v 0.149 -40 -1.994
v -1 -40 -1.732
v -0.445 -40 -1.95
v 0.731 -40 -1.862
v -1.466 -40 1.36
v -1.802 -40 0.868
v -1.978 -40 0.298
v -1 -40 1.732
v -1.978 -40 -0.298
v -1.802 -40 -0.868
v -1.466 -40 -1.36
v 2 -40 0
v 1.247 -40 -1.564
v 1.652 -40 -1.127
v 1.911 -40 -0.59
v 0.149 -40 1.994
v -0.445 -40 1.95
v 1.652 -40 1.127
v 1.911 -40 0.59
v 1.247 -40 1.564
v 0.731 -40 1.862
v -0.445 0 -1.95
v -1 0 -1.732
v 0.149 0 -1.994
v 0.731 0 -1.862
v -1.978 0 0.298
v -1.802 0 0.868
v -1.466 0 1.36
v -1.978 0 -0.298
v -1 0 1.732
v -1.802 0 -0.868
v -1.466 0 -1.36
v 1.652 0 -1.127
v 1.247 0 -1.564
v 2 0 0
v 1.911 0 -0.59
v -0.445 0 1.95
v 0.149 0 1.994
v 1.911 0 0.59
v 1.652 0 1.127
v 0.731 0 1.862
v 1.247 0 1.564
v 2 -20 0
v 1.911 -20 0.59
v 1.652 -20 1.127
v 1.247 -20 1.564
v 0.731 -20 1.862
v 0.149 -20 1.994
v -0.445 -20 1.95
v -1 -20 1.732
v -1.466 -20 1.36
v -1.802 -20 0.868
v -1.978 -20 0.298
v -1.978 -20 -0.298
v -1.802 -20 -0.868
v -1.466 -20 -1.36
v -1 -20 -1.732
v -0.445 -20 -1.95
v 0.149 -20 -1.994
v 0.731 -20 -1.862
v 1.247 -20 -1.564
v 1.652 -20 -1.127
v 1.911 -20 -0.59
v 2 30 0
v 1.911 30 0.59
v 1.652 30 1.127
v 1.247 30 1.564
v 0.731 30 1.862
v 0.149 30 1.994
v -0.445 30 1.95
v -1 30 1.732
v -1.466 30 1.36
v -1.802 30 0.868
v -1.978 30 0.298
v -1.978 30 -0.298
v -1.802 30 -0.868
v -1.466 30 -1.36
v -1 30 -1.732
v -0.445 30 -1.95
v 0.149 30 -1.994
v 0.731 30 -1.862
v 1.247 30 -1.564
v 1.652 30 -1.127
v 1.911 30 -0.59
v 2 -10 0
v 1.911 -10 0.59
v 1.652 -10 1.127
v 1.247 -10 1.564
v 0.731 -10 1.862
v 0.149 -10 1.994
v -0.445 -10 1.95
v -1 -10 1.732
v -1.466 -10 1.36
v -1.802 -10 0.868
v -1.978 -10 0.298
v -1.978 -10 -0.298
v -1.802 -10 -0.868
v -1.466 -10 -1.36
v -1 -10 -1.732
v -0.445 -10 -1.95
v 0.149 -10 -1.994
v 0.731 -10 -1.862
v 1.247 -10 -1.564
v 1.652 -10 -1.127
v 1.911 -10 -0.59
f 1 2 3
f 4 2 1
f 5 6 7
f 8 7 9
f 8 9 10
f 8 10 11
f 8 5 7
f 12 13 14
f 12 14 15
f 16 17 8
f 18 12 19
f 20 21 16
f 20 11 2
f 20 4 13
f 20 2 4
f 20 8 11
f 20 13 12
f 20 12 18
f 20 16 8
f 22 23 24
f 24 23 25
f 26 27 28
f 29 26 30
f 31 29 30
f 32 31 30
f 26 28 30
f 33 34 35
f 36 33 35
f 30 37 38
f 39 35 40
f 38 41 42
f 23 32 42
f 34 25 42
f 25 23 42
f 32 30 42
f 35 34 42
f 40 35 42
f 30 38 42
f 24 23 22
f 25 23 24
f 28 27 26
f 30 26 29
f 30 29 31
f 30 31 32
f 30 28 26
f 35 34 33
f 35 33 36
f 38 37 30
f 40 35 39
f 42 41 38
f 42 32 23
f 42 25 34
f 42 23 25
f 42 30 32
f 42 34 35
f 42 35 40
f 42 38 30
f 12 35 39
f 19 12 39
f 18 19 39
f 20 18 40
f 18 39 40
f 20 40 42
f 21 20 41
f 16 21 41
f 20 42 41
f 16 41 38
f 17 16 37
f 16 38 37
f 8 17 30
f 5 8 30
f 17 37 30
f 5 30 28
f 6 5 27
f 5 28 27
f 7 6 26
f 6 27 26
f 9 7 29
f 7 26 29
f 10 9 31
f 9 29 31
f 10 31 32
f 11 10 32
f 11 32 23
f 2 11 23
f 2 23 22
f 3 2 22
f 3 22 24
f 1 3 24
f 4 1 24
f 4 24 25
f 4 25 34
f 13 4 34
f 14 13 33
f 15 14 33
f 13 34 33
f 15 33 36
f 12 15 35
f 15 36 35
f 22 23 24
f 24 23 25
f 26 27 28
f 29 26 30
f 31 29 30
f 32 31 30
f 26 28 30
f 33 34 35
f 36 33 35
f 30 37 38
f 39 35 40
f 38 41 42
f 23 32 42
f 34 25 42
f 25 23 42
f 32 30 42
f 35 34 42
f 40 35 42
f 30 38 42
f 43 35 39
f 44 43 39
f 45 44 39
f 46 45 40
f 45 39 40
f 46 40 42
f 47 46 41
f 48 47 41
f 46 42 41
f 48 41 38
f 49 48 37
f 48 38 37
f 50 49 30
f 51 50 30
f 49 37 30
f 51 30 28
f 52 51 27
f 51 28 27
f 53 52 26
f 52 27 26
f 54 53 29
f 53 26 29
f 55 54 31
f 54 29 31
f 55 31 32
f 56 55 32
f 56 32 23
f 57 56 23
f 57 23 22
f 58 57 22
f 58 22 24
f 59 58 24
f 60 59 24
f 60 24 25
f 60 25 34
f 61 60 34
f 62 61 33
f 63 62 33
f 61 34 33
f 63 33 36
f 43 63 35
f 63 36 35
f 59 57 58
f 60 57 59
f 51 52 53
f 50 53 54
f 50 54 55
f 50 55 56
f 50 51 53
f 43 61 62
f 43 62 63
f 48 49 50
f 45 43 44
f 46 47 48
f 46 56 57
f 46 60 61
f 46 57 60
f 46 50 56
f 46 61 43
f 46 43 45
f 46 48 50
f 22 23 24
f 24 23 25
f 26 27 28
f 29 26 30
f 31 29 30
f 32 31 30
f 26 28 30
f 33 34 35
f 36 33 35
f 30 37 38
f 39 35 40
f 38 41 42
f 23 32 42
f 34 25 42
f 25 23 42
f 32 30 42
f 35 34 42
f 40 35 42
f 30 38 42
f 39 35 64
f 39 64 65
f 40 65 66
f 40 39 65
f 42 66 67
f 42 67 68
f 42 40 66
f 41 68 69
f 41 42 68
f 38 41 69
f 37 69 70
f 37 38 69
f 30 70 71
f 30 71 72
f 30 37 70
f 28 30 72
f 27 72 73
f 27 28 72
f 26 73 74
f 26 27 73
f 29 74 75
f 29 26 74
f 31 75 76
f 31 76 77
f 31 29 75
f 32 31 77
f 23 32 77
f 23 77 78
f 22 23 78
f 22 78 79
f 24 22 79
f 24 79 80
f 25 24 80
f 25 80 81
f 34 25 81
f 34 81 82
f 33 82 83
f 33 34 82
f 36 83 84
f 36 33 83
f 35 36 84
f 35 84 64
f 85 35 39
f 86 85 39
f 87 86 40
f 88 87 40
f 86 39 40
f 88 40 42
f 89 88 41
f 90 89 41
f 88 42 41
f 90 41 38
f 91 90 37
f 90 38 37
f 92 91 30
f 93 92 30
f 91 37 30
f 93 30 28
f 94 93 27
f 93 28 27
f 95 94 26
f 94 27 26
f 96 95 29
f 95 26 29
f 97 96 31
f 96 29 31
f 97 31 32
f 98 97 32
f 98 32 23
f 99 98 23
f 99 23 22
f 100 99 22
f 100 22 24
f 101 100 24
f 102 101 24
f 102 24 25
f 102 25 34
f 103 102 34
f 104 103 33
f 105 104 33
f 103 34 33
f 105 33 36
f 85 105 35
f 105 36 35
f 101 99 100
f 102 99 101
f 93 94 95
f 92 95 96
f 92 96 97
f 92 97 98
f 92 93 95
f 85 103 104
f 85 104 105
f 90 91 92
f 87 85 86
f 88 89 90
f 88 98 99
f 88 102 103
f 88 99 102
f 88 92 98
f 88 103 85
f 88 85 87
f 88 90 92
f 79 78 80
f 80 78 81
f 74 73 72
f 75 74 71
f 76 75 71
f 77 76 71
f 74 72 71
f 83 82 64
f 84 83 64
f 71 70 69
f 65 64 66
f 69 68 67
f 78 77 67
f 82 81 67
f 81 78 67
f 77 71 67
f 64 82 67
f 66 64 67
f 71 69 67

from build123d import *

# Parameters (mm, degrees)
F0_R     = 2
F1_DEPTH = 20
F2_DEPTH = 30
F3_DEPTH = 40
F4_DEPTH = 10


with BuildPart() as f1:
    # F0 (on Front) → F1 (new body)
    with BuildSketch(Plane.XZ):
        Circle(F0_R)
    extrude(amount=F1_DEPTH)


with BuildPart() as f2:
    # F0 (on Front) → F2 (new body)
    with BuildSketch(Plane.XZ):
        Circle(F0_R)
    extrude(amount=-F2_DEPTH)


with BuildPart() as f3:
    # F0 (on Front) → F3 (new body)
    with BuildSketch(Plane.XZ):
        Circle(F0_R)
    extrude(amount=F3_DEPTH)


with BuildPart() as f4:
    # F0 (on Front) → F4 (new body)
    with BuildSketch(Plane.XZ):
        Circle(F0_R)
    extrude(amount=F4_DEPTH)


solid = Compound([f1.part, f2.part, f3.part, f4.part])
